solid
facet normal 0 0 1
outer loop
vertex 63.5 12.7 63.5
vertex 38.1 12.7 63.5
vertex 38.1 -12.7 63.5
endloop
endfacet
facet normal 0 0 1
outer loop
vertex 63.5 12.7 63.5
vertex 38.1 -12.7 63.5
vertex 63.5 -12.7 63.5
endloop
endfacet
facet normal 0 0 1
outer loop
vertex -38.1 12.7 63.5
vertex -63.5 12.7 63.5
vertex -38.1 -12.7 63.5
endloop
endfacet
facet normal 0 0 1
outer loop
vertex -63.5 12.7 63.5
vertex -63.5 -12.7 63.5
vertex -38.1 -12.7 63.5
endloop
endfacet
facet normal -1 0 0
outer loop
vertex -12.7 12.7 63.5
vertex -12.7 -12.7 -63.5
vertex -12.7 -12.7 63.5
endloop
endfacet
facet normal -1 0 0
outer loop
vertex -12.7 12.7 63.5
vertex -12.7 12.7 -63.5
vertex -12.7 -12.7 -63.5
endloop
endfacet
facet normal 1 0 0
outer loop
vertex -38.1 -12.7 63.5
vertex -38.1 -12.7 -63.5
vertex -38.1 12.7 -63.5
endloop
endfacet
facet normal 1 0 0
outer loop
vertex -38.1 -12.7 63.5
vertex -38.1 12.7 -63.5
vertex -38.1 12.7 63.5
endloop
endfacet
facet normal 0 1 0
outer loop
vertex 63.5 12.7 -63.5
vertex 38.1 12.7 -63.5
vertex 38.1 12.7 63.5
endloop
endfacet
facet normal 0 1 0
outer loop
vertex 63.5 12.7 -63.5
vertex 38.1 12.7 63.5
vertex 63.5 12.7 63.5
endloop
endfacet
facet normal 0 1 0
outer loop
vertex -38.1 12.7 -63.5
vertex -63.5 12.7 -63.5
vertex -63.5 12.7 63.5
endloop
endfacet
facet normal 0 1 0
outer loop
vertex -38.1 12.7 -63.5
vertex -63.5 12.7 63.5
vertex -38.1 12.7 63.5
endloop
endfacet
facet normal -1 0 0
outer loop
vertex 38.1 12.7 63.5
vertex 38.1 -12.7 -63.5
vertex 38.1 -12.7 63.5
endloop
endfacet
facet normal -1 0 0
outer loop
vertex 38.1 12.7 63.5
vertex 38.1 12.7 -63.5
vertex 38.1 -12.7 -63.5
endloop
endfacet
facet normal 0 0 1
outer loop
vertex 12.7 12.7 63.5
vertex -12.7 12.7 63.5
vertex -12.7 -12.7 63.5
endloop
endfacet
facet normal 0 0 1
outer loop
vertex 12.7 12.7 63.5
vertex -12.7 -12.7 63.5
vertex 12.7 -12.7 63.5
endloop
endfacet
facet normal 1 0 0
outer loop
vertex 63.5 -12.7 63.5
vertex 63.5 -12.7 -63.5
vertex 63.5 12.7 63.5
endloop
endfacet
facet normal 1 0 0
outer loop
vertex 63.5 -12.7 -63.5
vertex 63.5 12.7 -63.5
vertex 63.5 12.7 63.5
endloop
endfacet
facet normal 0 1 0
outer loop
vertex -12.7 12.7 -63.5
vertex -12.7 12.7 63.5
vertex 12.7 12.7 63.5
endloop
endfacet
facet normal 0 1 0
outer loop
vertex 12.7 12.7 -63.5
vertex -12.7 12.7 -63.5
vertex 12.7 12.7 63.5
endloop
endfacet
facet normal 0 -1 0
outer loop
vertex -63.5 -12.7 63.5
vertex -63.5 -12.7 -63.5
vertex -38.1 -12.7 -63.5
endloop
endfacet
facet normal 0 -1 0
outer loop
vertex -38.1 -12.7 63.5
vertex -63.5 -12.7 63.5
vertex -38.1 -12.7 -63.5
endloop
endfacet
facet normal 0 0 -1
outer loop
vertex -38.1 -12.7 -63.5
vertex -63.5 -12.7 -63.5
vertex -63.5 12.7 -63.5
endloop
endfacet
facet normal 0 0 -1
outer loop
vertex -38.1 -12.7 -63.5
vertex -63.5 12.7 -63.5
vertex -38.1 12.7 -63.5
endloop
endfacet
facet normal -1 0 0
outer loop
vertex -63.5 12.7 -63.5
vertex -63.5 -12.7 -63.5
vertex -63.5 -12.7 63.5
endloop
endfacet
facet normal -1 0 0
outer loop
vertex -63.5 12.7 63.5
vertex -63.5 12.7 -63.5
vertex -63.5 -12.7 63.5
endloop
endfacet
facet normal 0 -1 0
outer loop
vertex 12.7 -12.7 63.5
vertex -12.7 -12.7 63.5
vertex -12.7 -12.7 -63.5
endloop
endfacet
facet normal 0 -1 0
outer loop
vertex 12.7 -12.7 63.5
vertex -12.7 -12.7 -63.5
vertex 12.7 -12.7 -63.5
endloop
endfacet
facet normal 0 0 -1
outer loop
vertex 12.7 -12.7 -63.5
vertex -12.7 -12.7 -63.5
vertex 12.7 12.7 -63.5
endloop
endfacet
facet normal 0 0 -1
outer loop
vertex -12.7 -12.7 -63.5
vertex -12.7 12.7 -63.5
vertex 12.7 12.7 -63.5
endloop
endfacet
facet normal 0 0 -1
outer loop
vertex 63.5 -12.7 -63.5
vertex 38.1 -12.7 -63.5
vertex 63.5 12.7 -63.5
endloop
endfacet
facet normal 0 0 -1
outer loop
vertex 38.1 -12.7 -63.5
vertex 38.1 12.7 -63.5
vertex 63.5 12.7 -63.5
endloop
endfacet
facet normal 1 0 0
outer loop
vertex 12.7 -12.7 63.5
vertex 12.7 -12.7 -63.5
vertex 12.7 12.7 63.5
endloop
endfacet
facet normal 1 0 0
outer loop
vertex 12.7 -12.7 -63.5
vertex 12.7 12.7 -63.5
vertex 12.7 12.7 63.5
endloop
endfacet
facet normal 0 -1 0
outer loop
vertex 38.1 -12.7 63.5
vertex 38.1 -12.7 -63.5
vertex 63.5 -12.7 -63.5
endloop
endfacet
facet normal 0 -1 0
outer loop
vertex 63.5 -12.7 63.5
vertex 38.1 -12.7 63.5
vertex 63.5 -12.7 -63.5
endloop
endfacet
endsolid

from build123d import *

# Parameters (mm, degrees)
F0_W     = 25.4
F0_H     = 127
F1_DEPTH = 12.7


with BuildPart() as f1:
    # F0 (on Front) → F1 (new body, symmetric)
    with BuildSketch(Plane.XZ):
        Rectangle(F0_W, F0_H)
        with Locations((50.8, 0)):
            Rectangle(F0_W, F0_H)
        with Locations((-50.8, 0)):
            Rectangle(F0_W, F0_H)
    extrude(amount=F1_DEPTH, both=True)


solid = f1.part
